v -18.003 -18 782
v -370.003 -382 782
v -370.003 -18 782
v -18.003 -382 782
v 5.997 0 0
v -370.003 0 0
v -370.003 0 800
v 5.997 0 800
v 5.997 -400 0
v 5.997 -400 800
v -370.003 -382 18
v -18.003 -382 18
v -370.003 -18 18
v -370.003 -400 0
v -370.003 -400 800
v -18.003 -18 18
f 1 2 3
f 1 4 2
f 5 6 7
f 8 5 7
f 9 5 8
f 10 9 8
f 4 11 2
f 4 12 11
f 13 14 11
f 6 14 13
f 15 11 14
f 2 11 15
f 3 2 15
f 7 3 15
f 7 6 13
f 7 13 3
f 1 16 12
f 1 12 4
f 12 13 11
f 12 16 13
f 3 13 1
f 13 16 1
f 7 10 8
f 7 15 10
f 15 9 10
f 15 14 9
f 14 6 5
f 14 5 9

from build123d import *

# Parameters (mm, degrees)
F0_W     = 42.7973791957
F0_H     = 46.9045490026
F1_DEPTH = 800
F2_DEPTH = 400
F3_DEPTH = 100
F4_DEPTH = 42.8
F5_DEPTH = 370
F6_T     = -18
F7_DEPTH = 6


with BuildPart() as f1:
    # F0 (on Top) → F1 (new body)
    with BuildSketch(Plane.XY):
        with Locations((21.3986895978, -23.4522745013)):
            Rectangle(F0_W, F0_H)
    extrude(amount=F1_DEPTH)

    # F2 (add): a face of the model
    f2_faces = [f1.faces().sort_by_distance(p)[0] for p in [
        (21.3986895978, 0, 400),
    ]]
    extrude(f2_faces, amount=-F2_DEPTH)

    # F3 (add): a face of the model
    f3_faces = [f1.faces().sort_by_distance(p)[0] for p in [
        (0, -200, 400),
    ]]
    extrude(f3_faces, amount=F3_DEPTH)

    # F4 (cut): a face of the model
    f4_faces = [f1.faces().sort_by_distance(p)[0] for p in [
        (42.7973791957, -200, 400),
    ]]
    extrude(f4_faces, amount=-F4_DEPTH, mode=Mode.SUBTRACT)

    # F5 (add): a face of the model
    f5_faces = [f1.faces().sort_by_distance(p)[0] for p in [
        (-0.0026208043, -200, 400),
    ]]
    extrude(f5_faces, amount=-F5_DEPTH)

    # F6
    f6_openings = [f1.faces().sort_by_distance(p)[0] for p in [
        (-370.002621, -200, 400),
    ]]
    offset(amount=F6_T, openings=f6_openings)

    # F7 (add): a face of the model
    f7_faces = [f1.faces().sort_by_distance(p)[0] for p in [
        (-0.0026208043, -200, 400),
    ]]
    extrude(f7_faces, amount=F7_DEPTH)


solid = f1.part
